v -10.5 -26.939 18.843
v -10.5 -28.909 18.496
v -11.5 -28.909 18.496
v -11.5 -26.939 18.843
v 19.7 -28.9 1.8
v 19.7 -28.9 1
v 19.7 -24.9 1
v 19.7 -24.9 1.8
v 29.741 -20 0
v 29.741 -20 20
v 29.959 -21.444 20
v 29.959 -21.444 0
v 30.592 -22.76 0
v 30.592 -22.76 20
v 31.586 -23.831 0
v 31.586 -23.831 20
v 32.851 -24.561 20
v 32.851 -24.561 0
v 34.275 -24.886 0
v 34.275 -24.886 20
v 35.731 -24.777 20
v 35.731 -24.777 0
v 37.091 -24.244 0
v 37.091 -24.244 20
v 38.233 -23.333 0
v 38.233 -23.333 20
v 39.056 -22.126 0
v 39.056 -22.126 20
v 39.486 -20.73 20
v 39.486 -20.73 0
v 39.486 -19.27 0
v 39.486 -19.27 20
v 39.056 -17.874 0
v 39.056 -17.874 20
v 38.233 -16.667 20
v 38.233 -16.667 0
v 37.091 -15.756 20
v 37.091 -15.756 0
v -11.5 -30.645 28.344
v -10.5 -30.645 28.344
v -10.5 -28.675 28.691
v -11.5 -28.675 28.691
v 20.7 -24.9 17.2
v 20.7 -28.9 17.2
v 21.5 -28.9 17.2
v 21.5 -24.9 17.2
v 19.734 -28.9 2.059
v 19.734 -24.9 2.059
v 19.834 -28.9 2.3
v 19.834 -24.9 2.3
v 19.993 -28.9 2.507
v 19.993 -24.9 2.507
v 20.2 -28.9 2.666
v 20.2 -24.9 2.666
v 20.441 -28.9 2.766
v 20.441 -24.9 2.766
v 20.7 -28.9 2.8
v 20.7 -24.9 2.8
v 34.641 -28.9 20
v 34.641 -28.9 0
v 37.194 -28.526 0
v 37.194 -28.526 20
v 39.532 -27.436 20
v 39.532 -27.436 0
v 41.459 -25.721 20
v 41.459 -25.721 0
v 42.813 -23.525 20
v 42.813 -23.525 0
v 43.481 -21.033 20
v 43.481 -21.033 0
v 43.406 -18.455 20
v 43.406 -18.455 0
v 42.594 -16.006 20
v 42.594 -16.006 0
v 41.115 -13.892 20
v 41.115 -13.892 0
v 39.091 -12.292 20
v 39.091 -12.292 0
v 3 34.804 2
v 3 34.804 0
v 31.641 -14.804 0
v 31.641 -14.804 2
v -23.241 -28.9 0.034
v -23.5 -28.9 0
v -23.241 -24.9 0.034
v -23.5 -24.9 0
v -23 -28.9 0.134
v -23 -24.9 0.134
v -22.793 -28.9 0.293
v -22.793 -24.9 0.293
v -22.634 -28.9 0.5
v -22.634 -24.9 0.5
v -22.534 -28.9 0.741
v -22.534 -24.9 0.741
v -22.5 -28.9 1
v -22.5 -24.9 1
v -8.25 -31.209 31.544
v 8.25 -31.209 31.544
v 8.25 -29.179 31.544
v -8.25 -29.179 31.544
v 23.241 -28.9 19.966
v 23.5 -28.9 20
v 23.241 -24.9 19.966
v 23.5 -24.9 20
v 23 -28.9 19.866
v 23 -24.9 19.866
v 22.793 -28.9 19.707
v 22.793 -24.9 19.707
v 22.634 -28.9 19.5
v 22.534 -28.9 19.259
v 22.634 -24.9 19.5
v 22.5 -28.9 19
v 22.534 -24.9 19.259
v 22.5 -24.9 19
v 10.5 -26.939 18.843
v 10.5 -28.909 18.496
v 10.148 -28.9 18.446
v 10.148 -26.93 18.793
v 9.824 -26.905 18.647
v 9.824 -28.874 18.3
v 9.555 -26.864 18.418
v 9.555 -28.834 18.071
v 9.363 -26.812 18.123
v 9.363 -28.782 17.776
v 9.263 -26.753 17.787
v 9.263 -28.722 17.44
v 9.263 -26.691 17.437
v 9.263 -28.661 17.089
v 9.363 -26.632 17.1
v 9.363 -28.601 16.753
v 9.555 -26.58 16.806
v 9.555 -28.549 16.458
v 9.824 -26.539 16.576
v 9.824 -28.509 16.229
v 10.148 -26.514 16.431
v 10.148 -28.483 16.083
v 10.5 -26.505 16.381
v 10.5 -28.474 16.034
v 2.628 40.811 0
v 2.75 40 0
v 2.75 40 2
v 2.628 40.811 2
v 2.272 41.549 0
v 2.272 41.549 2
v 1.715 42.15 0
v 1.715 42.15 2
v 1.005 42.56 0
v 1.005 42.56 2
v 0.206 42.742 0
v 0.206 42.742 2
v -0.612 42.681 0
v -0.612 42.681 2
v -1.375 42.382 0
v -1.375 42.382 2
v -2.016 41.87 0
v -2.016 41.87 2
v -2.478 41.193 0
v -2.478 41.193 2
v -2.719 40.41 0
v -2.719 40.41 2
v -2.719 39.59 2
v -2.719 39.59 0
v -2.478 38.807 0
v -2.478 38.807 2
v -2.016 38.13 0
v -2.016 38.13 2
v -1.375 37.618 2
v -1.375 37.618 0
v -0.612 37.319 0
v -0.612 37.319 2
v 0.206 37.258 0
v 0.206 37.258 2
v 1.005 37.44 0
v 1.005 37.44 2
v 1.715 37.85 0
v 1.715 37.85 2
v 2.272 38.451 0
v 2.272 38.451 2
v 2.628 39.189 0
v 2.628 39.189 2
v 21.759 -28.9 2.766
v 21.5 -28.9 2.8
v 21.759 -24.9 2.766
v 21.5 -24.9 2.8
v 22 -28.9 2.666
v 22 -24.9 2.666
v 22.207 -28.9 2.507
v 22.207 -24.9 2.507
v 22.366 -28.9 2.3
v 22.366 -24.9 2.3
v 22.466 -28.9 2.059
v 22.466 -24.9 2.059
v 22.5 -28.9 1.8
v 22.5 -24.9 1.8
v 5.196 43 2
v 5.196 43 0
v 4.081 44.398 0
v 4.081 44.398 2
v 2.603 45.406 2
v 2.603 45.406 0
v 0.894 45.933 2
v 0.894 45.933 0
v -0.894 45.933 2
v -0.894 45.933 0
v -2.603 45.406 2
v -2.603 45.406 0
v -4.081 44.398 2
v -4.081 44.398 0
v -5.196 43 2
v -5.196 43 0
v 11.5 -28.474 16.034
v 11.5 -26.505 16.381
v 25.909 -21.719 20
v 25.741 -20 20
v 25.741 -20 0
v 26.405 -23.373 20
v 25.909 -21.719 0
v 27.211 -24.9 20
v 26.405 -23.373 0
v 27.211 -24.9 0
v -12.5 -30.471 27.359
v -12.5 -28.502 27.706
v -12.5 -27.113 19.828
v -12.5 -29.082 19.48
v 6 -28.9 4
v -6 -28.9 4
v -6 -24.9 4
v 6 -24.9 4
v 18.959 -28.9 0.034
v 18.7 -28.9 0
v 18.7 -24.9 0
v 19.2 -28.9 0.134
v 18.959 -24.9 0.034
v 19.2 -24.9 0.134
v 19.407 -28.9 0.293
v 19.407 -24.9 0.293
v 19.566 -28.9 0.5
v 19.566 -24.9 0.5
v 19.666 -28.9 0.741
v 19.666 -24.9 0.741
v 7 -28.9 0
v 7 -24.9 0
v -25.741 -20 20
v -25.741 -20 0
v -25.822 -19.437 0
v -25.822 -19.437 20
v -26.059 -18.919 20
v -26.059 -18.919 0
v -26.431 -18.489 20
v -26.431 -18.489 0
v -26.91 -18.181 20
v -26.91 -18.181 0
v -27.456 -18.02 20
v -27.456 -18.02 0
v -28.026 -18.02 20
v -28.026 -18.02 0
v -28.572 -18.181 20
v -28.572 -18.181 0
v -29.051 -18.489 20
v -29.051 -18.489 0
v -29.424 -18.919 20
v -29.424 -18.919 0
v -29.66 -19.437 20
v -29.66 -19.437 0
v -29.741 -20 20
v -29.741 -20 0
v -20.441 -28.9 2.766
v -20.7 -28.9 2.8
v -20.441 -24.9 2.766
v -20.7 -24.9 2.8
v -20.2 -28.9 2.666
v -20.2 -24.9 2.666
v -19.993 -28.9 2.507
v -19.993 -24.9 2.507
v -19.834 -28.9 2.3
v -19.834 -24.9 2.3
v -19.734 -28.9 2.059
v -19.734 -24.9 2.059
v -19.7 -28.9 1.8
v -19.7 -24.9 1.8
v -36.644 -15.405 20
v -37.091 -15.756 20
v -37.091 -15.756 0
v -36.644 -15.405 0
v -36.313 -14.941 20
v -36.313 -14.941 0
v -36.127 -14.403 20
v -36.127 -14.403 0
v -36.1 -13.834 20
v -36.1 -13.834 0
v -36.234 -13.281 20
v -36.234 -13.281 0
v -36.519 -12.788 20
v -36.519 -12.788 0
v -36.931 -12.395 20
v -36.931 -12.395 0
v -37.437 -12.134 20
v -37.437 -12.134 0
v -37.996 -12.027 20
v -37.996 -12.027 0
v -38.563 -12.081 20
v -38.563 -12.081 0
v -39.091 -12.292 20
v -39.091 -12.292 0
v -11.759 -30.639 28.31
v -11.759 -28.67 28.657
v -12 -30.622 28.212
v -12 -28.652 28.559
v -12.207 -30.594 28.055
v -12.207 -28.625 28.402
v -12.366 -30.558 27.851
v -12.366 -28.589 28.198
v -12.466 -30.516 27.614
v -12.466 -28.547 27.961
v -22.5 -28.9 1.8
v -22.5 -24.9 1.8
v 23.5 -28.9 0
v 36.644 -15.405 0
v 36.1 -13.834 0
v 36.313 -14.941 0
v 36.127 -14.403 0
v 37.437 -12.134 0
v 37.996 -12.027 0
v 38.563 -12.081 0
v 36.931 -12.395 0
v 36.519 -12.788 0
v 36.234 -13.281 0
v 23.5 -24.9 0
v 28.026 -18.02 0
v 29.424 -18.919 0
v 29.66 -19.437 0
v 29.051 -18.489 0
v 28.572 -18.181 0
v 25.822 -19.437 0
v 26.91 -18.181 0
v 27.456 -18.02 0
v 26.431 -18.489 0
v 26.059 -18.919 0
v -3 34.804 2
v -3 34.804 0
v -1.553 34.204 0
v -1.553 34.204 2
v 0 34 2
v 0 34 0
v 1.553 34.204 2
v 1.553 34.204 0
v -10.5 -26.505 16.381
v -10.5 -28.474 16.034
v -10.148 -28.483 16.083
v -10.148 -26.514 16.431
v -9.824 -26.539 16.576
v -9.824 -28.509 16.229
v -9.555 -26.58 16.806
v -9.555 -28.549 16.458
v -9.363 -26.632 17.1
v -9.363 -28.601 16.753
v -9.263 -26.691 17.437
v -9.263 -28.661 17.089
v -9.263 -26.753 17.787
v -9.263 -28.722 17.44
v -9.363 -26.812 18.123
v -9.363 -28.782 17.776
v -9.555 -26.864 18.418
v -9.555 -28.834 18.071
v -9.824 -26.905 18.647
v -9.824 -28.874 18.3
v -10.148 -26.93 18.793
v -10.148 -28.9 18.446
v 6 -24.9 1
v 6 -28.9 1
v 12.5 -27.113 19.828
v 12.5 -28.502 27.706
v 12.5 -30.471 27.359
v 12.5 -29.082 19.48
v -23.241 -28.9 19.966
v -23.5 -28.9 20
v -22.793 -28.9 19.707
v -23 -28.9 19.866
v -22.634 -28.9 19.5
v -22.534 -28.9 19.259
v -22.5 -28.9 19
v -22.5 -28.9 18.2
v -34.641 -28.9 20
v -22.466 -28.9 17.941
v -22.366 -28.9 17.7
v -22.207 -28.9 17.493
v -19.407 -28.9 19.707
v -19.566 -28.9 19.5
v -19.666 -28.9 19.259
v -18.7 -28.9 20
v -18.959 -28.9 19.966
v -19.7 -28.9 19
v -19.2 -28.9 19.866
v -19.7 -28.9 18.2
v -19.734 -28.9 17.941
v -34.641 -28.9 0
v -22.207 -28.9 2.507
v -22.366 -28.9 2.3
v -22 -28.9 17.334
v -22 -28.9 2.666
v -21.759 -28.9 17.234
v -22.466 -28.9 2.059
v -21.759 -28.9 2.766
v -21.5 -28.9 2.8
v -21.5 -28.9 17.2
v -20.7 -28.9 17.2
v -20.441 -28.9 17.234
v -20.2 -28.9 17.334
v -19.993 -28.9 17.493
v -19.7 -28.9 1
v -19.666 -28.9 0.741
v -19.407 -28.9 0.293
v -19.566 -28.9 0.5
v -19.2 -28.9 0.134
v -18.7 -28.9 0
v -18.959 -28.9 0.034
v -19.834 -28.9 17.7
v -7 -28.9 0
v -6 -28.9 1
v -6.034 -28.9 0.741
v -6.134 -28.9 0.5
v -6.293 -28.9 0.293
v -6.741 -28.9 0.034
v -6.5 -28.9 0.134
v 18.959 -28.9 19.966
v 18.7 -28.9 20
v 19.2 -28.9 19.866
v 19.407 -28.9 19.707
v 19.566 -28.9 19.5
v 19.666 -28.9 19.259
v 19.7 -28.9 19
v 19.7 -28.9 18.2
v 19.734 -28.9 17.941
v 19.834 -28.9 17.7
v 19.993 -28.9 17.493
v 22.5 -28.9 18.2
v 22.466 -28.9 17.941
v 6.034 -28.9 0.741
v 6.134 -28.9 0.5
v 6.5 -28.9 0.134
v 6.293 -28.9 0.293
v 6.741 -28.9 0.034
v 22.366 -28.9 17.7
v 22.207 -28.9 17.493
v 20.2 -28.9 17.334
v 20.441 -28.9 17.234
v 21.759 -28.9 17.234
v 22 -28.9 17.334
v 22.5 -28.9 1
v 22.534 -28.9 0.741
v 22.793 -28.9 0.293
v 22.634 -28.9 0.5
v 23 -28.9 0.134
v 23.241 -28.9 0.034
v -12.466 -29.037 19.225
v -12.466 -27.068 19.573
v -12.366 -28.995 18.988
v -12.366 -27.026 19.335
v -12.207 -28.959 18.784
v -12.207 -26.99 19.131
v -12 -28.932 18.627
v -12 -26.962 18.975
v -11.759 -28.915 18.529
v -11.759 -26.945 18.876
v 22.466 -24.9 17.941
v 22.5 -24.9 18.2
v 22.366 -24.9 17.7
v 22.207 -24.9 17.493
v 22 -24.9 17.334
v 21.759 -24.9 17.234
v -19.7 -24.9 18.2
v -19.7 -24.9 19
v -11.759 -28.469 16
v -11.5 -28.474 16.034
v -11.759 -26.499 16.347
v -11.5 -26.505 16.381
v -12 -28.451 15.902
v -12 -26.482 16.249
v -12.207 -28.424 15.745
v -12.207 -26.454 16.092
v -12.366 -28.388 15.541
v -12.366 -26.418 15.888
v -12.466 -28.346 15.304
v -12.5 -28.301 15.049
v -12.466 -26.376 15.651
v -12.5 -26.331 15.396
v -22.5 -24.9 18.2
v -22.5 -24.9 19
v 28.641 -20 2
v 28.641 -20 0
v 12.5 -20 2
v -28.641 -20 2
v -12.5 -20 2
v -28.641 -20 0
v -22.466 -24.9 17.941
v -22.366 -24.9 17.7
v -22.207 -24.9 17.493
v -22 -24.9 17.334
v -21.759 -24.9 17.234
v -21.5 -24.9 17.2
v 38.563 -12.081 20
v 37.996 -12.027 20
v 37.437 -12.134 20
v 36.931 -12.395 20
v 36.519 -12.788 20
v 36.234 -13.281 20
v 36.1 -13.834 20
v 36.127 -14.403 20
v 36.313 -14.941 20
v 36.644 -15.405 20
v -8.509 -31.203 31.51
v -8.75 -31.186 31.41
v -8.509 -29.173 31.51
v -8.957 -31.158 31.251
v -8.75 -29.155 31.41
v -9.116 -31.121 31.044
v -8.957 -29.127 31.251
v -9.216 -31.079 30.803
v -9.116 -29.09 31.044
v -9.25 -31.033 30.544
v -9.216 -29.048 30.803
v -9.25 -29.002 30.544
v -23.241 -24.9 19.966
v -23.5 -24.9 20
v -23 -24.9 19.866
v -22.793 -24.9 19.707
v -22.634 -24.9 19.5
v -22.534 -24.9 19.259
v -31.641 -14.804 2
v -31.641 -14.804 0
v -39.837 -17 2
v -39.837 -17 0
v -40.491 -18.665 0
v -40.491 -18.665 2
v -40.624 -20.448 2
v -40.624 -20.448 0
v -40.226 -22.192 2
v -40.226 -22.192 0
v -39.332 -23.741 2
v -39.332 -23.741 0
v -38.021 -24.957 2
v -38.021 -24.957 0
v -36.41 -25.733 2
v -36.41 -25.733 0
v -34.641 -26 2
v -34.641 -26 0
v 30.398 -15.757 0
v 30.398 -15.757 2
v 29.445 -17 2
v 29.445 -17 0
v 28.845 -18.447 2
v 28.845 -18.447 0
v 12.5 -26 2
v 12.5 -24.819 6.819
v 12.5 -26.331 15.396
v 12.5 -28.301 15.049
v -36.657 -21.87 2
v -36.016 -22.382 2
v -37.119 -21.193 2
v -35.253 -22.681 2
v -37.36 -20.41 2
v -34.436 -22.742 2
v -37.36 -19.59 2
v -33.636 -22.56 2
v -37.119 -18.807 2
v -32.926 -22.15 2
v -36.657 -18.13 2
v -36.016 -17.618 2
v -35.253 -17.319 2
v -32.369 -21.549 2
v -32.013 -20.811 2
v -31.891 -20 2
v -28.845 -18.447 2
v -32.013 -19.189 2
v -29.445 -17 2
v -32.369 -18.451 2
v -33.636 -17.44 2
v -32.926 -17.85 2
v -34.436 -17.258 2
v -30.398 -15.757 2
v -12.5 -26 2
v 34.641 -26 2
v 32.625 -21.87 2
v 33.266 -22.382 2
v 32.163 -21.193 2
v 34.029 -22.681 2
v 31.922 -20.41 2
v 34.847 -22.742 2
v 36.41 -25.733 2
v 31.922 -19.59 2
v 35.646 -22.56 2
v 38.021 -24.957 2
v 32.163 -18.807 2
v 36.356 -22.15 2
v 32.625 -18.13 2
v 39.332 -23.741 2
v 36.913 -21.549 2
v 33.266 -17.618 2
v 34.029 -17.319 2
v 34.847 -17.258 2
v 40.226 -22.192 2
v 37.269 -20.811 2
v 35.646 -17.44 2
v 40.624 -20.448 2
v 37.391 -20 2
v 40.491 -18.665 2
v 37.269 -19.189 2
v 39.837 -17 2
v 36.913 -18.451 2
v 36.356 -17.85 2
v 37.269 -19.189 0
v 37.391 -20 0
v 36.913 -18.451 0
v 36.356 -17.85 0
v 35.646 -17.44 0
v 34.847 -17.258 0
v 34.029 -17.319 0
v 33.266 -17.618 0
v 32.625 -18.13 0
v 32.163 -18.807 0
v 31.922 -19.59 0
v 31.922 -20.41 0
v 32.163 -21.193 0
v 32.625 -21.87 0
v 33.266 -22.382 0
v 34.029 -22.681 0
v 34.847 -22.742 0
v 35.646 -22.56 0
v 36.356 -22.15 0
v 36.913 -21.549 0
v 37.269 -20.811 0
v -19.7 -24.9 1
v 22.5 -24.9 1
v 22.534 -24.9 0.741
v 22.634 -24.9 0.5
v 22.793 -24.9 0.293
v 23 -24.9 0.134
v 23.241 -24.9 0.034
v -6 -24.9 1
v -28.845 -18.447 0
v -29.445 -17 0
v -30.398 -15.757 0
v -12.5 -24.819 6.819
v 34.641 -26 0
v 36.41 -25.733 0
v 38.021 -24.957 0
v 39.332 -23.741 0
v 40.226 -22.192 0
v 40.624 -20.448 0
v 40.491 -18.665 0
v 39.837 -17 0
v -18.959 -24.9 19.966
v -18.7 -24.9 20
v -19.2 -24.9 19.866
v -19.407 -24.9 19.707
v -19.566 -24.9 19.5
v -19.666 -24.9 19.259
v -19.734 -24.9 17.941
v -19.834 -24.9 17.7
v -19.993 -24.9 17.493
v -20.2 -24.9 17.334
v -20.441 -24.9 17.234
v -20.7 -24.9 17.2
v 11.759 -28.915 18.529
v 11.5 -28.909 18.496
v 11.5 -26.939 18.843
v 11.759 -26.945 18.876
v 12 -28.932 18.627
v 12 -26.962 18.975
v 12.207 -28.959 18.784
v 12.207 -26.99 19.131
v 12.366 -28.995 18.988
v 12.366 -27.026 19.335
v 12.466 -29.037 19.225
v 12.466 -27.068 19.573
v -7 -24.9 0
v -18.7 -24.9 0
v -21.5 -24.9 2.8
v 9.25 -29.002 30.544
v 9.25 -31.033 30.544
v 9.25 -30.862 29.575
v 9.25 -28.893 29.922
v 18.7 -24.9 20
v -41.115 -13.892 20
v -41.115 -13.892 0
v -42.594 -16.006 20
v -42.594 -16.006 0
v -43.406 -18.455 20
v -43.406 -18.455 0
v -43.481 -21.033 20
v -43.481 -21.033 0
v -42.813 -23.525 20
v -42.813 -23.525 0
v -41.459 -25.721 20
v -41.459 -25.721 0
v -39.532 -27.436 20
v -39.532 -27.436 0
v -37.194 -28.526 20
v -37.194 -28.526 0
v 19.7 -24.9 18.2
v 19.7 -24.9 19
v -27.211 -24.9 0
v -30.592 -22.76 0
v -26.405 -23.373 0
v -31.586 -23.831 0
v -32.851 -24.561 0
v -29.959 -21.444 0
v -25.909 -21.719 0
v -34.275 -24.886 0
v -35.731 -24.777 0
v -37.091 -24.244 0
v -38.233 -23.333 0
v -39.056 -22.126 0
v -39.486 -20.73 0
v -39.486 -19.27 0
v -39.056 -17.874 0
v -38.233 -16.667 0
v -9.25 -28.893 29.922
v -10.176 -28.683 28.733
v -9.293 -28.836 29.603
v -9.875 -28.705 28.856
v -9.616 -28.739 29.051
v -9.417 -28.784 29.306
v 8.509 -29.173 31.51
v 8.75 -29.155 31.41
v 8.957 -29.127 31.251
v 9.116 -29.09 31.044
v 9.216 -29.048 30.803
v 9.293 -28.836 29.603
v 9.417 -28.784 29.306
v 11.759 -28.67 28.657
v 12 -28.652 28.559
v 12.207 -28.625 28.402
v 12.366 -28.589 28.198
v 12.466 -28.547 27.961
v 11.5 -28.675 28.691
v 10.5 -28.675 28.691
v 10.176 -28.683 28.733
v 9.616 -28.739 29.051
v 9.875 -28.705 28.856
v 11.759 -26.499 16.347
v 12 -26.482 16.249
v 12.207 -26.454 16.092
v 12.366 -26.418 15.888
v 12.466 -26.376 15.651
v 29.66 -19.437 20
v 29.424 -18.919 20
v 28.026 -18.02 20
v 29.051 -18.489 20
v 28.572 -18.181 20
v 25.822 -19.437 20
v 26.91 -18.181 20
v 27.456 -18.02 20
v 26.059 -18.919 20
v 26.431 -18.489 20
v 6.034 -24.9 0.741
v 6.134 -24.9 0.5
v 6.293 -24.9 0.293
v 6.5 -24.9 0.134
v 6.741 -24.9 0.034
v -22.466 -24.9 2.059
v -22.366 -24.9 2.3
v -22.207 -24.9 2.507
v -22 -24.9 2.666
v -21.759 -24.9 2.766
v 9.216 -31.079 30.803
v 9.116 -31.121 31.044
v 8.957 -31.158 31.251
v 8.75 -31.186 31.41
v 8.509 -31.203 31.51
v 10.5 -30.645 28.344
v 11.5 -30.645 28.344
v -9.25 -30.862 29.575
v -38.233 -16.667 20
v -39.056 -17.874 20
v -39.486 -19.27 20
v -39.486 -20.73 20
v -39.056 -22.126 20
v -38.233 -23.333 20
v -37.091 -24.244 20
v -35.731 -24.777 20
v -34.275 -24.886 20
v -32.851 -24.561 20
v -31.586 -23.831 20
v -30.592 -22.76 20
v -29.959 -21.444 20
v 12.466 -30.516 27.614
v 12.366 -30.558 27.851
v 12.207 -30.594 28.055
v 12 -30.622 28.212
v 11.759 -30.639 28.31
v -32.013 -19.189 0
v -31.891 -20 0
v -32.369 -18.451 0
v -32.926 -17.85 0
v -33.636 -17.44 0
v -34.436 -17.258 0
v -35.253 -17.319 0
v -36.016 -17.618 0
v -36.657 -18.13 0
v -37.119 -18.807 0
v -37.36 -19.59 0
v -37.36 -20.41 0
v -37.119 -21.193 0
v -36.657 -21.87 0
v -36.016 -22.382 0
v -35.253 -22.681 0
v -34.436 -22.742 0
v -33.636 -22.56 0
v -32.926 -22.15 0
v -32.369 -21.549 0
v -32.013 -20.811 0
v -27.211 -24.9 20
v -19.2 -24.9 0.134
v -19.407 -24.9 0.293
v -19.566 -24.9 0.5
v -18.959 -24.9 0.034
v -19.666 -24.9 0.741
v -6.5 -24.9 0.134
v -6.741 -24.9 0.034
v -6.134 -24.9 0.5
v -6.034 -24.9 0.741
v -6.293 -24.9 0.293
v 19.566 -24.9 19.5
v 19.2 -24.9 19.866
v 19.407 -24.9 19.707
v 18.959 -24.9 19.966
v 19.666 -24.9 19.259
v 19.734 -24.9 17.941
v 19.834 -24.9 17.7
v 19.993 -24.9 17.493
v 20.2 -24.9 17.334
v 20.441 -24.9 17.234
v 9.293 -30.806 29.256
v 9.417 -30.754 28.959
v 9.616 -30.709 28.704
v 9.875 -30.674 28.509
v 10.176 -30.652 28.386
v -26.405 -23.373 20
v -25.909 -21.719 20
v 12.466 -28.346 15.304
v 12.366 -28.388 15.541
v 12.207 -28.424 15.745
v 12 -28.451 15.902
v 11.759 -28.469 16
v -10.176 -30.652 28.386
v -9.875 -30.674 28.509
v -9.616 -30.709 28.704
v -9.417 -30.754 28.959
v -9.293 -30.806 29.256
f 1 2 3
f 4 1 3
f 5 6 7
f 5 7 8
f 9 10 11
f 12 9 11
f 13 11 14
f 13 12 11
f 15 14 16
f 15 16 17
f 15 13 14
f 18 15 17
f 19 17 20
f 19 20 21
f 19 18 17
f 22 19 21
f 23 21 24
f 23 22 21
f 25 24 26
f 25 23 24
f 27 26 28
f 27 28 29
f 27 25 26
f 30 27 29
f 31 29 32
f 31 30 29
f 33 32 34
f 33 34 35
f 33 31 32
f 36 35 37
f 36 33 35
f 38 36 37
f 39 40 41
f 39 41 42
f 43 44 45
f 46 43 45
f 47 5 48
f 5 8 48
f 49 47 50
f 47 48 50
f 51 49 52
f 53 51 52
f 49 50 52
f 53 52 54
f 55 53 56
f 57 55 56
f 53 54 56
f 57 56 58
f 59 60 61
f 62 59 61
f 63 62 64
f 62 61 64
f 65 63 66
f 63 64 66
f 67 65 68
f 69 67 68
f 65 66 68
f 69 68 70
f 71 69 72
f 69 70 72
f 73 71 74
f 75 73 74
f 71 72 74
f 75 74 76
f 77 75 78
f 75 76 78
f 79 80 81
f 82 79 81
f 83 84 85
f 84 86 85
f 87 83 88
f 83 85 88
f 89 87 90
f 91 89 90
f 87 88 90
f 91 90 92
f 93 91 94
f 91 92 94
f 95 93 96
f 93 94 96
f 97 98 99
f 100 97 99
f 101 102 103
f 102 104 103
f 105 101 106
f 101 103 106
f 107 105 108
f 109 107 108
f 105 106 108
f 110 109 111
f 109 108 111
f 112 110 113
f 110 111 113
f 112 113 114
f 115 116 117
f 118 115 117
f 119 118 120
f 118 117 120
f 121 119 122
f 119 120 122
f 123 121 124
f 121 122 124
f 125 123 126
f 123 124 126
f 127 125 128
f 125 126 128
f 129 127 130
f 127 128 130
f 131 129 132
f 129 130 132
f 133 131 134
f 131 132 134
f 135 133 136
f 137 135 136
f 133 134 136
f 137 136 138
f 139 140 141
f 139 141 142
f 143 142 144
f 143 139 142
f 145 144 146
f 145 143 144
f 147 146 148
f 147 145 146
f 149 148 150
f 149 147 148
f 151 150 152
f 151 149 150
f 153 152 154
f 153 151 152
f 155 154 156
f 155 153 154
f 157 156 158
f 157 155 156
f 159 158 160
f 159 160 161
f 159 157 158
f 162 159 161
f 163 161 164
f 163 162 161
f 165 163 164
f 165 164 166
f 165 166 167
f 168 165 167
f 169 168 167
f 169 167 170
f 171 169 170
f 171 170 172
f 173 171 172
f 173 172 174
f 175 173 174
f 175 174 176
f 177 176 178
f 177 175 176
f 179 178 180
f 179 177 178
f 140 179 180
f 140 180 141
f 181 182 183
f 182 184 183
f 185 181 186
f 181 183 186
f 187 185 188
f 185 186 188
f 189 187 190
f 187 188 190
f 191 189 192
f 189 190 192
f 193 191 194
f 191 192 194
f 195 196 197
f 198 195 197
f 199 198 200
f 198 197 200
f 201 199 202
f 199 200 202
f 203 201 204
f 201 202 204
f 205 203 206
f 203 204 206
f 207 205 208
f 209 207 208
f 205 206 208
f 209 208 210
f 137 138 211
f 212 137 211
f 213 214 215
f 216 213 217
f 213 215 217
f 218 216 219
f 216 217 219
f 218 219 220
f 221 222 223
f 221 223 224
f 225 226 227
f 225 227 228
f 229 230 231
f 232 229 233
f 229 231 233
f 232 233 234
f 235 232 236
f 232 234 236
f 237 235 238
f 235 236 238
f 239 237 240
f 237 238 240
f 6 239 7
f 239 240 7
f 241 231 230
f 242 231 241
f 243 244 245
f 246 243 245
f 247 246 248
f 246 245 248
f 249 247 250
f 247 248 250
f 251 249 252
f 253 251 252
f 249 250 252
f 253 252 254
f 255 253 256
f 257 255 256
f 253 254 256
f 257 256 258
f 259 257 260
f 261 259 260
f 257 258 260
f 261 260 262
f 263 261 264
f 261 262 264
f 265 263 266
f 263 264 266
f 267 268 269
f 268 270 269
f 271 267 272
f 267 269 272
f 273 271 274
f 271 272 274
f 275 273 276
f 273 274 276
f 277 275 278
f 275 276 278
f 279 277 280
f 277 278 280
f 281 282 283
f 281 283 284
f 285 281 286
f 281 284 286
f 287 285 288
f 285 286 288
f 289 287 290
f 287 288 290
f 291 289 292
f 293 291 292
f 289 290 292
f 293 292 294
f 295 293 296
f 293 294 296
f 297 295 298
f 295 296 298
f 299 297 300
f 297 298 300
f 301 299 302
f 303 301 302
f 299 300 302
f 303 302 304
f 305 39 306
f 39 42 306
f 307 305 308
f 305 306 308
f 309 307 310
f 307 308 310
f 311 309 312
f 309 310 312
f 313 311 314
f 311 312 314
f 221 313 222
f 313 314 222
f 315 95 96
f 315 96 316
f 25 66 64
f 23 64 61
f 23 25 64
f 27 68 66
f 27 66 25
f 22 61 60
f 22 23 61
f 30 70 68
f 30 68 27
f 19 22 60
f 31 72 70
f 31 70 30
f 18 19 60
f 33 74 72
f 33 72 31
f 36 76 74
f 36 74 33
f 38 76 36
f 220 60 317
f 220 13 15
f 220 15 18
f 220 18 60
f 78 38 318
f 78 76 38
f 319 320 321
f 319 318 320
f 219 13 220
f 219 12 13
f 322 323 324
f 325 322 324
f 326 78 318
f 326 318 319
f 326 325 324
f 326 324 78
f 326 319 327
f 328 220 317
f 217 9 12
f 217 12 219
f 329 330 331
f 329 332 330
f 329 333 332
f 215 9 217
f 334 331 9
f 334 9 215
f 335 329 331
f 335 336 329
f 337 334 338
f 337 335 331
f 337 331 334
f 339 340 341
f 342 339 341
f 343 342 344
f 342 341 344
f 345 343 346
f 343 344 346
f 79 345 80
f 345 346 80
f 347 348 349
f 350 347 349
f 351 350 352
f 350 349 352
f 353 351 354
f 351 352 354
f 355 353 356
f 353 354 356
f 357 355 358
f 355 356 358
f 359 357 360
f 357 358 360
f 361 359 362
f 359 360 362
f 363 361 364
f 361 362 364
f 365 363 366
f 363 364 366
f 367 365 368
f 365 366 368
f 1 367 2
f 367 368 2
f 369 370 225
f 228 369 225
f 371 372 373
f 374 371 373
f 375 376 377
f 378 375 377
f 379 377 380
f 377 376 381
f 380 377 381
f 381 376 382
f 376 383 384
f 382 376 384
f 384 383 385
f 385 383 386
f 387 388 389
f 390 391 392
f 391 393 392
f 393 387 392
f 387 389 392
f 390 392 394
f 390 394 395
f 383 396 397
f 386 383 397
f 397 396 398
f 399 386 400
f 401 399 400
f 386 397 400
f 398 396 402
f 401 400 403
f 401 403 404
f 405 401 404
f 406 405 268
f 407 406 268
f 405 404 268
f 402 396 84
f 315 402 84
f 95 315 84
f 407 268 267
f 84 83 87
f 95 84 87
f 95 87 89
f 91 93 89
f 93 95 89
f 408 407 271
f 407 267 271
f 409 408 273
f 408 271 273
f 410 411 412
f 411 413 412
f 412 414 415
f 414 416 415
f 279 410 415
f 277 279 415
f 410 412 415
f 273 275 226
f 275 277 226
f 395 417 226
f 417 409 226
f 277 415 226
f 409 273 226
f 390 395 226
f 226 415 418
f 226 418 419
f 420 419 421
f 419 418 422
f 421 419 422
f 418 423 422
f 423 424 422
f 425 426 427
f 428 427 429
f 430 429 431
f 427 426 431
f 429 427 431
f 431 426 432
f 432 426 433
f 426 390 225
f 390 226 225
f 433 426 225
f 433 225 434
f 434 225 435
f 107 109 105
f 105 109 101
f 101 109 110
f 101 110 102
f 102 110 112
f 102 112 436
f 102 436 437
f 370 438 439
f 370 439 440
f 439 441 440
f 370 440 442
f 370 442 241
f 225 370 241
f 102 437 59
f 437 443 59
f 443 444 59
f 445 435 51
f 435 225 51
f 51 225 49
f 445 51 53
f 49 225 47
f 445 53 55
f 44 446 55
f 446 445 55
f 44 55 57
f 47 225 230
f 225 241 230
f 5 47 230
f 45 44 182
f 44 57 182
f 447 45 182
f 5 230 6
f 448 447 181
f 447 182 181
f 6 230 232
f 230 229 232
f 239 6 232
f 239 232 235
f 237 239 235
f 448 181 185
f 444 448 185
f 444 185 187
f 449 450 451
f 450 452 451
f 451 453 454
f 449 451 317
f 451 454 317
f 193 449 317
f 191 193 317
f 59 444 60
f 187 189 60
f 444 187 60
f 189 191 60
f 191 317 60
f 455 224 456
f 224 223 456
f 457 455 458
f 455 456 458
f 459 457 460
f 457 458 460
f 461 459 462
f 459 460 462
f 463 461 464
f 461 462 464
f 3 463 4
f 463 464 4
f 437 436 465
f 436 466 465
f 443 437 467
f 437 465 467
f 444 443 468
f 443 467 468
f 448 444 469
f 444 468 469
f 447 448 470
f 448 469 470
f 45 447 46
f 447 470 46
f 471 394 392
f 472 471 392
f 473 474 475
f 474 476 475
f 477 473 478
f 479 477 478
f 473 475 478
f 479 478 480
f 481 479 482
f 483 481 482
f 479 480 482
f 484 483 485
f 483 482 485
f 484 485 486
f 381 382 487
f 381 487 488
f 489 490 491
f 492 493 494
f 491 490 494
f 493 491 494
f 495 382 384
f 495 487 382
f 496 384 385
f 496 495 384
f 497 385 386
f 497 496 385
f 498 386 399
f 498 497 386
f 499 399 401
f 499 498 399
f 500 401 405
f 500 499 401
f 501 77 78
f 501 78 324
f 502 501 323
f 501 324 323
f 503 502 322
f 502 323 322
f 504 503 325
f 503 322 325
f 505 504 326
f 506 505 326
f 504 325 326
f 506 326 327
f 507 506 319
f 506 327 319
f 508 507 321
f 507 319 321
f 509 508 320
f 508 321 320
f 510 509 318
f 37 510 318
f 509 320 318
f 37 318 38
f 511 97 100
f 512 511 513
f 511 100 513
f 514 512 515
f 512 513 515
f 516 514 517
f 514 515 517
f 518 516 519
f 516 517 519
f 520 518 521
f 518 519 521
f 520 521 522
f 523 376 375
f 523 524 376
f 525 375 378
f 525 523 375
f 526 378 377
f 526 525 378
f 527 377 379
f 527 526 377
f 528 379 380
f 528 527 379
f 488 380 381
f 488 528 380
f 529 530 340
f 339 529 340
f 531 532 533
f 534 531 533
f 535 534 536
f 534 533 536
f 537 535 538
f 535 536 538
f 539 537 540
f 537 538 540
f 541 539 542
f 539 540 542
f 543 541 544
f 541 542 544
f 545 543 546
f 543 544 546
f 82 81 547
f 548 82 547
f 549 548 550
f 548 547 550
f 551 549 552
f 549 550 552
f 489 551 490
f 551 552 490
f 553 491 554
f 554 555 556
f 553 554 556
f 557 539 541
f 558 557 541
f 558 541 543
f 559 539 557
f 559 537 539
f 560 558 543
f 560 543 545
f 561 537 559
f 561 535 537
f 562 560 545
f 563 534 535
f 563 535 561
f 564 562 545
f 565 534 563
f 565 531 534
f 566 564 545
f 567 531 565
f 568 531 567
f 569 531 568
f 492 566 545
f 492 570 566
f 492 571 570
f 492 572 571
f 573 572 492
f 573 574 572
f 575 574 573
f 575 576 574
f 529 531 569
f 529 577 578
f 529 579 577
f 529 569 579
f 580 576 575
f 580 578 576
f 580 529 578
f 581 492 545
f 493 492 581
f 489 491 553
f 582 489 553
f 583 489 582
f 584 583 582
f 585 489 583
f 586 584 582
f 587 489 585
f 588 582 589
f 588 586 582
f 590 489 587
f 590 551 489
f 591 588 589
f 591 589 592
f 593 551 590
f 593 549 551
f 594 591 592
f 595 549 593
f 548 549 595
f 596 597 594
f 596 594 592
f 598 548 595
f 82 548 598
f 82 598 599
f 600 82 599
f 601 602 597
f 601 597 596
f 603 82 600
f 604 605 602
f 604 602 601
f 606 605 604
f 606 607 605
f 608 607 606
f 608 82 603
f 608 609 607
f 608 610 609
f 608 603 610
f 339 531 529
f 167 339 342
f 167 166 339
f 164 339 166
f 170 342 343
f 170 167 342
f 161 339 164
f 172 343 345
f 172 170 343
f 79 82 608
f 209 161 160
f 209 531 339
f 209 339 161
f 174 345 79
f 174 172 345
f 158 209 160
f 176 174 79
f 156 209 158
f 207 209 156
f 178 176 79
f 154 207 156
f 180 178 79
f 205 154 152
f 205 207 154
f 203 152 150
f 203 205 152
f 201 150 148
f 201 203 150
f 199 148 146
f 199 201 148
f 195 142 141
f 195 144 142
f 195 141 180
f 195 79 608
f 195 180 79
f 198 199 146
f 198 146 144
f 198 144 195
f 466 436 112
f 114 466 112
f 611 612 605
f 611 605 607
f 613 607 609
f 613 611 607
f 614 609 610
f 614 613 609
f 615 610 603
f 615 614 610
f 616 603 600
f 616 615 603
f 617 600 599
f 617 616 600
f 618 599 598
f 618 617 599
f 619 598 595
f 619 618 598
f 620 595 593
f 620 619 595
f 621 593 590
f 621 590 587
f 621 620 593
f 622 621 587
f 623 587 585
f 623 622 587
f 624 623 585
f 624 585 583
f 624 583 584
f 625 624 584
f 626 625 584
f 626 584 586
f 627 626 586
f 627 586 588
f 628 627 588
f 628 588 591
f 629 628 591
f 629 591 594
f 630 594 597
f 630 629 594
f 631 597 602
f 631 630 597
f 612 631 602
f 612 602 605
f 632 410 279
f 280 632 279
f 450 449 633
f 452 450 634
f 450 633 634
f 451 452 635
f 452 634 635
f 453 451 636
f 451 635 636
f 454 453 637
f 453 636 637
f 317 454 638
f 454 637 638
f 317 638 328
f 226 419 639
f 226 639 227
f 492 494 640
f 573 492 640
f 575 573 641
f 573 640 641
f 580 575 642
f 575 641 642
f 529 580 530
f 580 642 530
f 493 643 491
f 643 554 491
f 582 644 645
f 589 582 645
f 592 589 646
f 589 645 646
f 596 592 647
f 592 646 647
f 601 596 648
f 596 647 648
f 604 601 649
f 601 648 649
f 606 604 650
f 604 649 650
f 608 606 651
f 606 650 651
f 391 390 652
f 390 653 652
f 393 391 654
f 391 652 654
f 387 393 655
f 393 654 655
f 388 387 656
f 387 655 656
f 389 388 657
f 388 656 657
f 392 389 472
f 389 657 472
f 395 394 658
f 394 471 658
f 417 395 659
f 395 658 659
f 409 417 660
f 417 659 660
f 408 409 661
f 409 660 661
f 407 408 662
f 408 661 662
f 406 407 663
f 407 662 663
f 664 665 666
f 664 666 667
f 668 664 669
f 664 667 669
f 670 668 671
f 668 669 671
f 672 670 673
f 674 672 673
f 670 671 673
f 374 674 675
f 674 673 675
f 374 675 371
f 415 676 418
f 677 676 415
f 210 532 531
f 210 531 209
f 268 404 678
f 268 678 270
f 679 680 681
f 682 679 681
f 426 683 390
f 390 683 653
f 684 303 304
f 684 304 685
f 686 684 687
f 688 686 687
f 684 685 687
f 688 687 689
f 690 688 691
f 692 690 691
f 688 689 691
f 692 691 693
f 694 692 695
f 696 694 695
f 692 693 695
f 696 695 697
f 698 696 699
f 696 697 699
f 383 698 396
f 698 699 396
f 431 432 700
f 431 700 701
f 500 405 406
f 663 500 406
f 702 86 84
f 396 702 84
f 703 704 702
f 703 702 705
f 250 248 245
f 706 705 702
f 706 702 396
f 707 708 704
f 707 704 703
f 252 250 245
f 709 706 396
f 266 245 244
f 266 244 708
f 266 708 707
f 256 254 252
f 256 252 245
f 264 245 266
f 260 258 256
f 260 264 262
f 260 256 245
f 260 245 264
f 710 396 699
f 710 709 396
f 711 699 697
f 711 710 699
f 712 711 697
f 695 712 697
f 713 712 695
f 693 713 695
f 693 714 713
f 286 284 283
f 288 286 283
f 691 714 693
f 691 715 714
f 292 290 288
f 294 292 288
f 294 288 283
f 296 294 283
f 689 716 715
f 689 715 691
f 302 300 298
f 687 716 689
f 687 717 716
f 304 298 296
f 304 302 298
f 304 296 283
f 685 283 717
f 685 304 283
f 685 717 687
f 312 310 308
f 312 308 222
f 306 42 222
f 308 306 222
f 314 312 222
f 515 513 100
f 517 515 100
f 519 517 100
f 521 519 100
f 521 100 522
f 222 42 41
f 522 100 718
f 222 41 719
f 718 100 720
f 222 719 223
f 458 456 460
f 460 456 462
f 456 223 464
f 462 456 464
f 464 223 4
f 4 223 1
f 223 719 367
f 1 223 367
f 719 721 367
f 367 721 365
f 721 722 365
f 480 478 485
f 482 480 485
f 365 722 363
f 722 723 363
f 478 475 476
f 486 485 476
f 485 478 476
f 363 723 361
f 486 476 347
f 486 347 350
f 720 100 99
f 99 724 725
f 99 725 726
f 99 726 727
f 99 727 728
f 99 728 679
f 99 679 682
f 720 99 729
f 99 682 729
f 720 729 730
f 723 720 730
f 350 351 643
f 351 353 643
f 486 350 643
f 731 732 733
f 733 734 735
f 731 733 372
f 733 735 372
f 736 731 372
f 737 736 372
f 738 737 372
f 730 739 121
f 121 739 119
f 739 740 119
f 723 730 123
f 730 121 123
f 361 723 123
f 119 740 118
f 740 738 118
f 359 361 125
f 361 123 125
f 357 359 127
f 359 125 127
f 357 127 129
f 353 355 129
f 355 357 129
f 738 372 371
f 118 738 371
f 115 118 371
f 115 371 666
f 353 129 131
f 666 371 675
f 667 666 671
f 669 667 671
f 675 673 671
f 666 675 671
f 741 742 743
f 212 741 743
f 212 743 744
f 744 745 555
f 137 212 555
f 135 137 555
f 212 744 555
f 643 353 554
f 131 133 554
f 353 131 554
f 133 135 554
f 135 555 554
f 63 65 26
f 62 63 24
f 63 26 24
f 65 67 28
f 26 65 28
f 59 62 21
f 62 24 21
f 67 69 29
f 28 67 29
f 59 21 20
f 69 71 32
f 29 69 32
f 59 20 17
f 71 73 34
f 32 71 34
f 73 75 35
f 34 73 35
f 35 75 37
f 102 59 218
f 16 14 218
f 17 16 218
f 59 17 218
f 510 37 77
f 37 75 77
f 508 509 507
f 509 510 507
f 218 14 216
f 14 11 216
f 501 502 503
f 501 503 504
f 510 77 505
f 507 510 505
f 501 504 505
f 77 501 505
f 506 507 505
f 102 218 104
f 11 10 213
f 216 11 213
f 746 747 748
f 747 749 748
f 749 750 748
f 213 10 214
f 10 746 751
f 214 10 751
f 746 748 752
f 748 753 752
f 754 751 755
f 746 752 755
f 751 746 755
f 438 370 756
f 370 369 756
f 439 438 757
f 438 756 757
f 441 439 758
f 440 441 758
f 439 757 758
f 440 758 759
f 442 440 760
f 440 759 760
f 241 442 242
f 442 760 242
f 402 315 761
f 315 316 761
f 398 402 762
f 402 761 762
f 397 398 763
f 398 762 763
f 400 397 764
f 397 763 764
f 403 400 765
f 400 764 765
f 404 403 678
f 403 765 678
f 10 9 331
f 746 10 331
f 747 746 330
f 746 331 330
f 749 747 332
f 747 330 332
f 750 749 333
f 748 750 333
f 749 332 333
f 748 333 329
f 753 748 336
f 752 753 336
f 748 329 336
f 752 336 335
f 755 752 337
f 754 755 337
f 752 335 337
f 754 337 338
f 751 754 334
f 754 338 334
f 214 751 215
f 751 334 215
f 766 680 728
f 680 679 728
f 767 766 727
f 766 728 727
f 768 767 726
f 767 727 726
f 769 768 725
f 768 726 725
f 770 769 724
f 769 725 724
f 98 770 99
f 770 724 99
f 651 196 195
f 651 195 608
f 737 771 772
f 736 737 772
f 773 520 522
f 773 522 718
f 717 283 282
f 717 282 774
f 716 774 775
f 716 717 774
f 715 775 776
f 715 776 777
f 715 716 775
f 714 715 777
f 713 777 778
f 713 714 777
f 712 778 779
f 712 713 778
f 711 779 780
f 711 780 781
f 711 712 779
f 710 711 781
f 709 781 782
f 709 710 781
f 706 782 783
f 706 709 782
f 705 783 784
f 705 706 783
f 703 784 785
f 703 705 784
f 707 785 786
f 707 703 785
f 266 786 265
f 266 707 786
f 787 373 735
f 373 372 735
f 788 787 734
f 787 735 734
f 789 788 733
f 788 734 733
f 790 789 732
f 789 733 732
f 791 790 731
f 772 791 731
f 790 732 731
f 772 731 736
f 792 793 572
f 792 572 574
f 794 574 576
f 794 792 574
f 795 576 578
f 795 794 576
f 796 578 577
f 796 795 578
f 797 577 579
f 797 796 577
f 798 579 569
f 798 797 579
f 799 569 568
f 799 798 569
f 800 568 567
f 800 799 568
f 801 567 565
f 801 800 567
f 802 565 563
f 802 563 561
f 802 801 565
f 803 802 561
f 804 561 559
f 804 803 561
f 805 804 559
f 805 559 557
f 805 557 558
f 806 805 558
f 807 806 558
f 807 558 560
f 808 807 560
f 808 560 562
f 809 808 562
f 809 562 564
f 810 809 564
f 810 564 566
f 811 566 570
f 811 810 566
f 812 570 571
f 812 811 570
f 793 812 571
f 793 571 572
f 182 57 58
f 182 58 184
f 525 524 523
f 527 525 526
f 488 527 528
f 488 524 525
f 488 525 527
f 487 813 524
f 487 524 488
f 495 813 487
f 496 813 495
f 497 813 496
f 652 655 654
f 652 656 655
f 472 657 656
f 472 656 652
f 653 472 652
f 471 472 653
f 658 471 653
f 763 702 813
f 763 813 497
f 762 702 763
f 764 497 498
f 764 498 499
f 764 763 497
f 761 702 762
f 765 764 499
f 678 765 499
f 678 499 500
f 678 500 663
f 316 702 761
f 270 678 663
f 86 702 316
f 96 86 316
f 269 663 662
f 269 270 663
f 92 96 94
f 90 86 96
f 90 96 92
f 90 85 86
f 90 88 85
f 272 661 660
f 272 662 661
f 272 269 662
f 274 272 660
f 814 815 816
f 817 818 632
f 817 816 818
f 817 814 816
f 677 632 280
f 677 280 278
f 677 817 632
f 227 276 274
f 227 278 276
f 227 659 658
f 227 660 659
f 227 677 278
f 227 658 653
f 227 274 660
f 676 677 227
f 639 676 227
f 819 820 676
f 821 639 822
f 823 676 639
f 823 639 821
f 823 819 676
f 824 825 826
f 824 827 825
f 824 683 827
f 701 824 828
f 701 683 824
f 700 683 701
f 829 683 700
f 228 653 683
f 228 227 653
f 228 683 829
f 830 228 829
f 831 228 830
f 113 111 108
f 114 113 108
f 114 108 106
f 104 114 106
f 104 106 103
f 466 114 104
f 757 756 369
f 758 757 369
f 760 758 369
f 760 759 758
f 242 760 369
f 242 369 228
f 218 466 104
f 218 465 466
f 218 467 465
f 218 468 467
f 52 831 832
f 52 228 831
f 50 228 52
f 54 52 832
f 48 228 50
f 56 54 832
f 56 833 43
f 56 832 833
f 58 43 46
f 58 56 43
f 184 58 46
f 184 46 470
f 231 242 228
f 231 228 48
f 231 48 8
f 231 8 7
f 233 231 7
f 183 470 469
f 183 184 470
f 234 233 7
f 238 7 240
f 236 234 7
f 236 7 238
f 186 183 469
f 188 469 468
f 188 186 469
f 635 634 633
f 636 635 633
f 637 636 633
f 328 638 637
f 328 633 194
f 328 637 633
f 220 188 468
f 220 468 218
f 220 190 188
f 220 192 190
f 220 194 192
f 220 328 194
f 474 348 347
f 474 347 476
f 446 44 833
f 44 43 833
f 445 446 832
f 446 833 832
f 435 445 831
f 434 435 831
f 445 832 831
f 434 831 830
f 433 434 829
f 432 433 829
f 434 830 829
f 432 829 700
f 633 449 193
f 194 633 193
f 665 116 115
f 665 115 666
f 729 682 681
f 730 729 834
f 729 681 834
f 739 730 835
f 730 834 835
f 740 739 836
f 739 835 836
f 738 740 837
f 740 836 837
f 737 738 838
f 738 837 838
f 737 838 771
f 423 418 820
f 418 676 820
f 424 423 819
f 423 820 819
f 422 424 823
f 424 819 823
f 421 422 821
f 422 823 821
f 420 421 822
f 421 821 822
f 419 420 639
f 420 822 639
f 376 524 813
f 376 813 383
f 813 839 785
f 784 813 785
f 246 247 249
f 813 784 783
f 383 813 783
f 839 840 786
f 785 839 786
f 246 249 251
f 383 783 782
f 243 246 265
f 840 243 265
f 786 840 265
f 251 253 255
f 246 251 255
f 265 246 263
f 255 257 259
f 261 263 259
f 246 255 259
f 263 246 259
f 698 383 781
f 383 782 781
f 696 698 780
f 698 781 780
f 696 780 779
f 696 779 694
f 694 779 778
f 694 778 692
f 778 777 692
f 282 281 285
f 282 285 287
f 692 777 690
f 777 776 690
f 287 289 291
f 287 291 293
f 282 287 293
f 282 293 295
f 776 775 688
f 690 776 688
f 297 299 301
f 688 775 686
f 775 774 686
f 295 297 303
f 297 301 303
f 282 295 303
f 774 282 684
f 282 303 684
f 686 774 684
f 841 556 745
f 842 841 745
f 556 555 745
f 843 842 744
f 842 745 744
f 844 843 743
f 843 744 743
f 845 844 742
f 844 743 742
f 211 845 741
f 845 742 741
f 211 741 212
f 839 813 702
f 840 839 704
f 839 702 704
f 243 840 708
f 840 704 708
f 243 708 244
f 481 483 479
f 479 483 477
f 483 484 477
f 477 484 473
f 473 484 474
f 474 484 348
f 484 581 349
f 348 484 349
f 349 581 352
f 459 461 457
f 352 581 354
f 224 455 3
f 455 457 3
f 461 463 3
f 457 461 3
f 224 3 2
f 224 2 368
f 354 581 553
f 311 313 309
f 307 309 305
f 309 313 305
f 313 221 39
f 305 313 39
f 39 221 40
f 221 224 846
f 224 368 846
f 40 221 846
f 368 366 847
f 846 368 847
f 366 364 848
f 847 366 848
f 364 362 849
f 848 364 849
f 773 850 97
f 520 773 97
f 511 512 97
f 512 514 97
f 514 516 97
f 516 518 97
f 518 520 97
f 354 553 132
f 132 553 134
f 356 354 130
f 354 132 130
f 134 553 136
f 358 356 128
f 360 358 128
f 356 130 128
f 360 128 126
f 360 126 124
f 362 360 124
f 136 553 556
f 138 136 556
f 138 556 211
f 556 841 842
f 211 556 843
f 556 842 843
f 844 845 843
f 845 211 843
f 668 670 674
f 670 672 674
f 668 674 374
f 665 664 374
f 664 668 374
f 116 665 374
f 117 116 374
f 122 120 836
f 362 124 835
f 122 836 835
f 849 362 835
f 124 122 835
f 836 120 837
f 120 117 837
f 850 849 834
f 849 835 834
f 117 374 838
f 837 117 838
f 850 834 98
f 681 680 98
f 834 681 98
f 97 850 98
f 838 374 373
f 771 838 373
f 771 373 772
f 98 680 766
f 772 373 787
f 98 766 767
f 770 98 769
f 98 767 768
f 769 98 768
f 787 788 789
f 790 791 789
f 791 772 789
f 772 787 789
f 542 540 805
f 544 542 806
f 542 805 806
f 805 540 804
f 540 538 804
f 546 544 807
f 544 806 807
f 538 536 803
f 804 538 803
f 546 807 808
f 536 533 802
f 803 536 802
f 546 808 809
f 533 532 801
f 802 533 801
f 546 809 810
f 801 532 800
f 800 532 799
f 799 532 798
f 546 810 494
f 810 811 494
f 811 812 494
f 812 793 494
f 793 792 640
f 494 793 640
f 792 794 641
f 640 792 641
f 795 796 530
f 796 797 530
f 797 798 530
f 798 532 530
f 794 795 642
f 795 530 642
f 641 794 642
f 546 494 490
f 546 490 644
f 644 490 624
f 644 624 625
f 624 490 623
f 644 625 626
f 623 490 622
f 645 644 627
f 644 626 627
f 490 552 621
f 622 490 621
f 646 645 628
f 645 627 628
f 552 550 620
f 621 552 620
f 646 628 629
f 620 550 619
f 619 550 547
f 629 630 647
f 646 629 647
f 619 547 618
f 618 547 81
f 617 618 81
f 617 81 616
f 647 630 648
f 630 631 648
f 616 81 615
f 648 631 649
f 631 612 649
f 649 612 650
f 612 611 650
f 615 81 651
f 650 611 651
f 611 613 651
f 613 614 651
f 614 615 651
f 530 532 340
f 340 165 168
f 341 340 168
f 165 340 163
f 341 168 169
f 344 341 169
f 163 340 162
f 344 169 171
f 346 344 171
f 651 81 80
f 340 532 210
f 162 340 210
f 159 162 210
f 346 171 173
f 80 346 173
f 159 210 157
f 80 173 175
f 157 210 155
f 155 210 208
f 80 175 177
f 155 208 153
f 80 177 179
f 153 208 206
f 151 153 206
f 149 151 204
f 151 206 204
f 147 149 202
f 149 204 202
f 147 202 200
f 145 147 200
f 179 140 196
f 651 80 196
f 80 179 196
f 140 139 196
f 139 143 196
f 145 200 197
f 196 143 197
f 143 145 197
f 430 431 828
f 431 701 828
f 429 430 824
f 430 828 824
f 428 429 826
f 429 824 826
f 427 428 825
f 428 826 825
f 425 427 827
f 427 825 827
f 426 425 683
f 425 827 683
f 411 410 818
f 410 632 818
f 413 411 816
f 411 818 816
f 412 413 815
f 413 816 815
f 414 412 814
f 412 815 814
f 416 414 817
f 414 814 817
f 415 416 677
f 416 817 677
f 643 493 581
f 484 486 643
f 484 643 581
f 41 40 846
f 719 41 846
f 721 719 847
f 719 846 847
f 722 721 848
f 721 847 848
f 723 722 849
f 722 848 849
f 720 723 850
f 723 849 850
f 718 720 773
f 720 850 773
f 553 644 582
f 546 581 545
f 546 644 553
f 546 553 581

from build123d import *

# Parameters (mm, degrees)
SKETCH_R          = 2.75
PAD_DEPTH         = 2
PAD001_DEPTH      = 12.5
PAD001_DEPTH_BACK = 12.5
POCKET_DEPTH      = 76.0374603668
FILLET_R          = 1
PAD002_DEPTH      = 20
SKETCH005_W       = 2.8
SKETCH005_H       = 2.8
SKETCH005_W_2     = 12
SKETCH005_H_2     = 4
POCKET001_DEPTH   = 4
FILLET001_R       = 1


with BuildPart() as body:
    # Sketch → Pad (new body)
    with BuildSketch(Plane.XY):
        with BuildLine():
            ThreePointArc((5.1961524227, 43), (0, 46), (-5.1961524227, 43))
            Line((-39.8371685741, -17), (-5.1961524227, 43))
            ThreePointArc((-39.8371685741, -17), (-39.8371685741, -23), (-34.6410161514, -26))
            Line((34.6410161514, -26), (-34.6410161514, -26))
            ThreePointArc((34.6410161514, -26), (39.8371685741, -23), (39.8371685741, -17))
            Line((5.1961524227, 43), (39.8371685741, -17))
        make_face()
        with Locations((0, 40)):
            Circle(SKETCH_R, mode=Mode.SUBTRACT)
        with Locations((-34.6410161514, -20)):
            Circle(SKETCH_R, mode=Mode.SUBTRACT)
        with Locations((34.6410161514, -20)):
            Circle(SKETCH_R, mode=Mode.SUBTRACT)
        with BuildLine():
            ThreePointArc((-28.6410161514, -20), (-29.4448637287, -17), (-31.6410161514, -14.8038475773))
            Line((-31.6410161514, -14.8038475773), (-3, 34.8038475773))
            ThreePointArc((-3, 34.8038475773), (0, 34), (3, 34.8038475773))
            Line((3, 34.8038475773), (31.6410161514, -14.8038475773))
            ThreePointArc((31.6410161514, -14.8038475773), (29.4448637287, -17), (28.6410161514, -20))
            Line((28.6410161514, -20), (-28.6410161514, -20))
        make_face(mode=Mode.SUBTRACT)
    extrude(amount=PAD_DEPTH)

    # Sketch001 → Pad001 (join, two sides)
    with BuildSketch(Plane.YZ) as pad001_sk:
        Polygon((-26, 2), (-31.20944533, 31.5442325904), (-29.1785921062, 31.5442325904), (-24.8188379166, 6.8188379166), (-20, 2), align=None)
    extrude(amount=PAD001_DEPTH)
    extrude(pad001_sk.sketch, amount=-PAD001_DEPTH_BACK)

    # Sketch003 (on Face7 of Pad001) → Pocket (cut, through all)
    with BuildSketch(Plane(origin=(0, -24.8739839269, -4.385954484), x_dir=(1, 0, 0), z_dir=(0, -0.984807753, -0.1736481777))):
        with BuildLine():
            ThreePointArc((-10.5, 33.2344681254), (-9.6161165235, 33.6005846489), (-9.25, 34.4844681254))
            Line((-9.25, 36.4844681254), (-9.25, 34.4844681254))
            Line((-12.5, 36.4844681254), (-9.25, 36.4844681254))
            Line((-12.5, 33.2344681254), (-12.5, 36.4844681254))
            Line((-10.5, 33.2344681254), (-12.5, 33.2344681254))
        make_face()
        with BuildLine():
            ThreePointArc((9.25, 34.4844681254), (9.6161165235, 33.6005846489), (10.5, 33.2344681254))
            Line((10.5, 33.2344681254), (12.5, 33.2344681254))
            Line((12.5, 33.2344681254), (12.5, 36.4844681254))
            Line((12.5, 36.4844681254), (9.25, 36.4844681254))
            Line((9.25, 36.4844681254), (9.25, 34.4844681254))
        make_face()
        with BuildLine():
            ThreePointArc((10.5, 23.2344681254), (9.25, 21.9844681254), (10.5, 20.7344681254))
            Line((10.5, 20.7344681254), (12.5, 20.7344681254))
            Line((12.5, 23.2344681254), (12.5, 20.7344681254))
            Line((10.5, 23.2344681254), (12.5, 23.2344681254))
        make_face()
        with BuildLine():
            ThreePointArc((-10.5, 20.7344681254), (-9.25, 21.9844681254), (-10.5, 23.2344681254))
            Line((-10.5, 23.2344681254), (-12.5, 23.2344681254))
            Line((-12.5, 20.7344681254), (-12.5, 23.2344681254))
            Line((-10.5, 20.7344681254), (-12.5, 20.7344681254))
        make_face()
    extrude(amount=-POCKET_DEPTH, mode=Mode.SUBTRACT)

    # Fillet
    fillet_edges = [body.edges().sort_by_distance(p)[0] for p in [
        (9.25, -30.194019, 31.544233),
        (-9.25, -30.194019, 31.544233),
        (-12.5, -29.660281, 28.517256),
        (12.5, -29.660281, 28.517256),
        (12.5, -27.489679, 16.207159),
        (-12.5, -27.489679, 16.207159),
        (-12.5, -27.923799, 18.669178),
        (12.5, -27.923799, 18.669178),
    ]]
    fillet(fillet_edges, radius=FILLET_R)


with BuildPart() as body001:
    # Sketch004 → Pad002 (new body)
    with BuildSketch(Plane.XY):
        with BuildLine():
            ThreePointArc((-37.0910161514, -15.7564755215), (-37.0910161514, -24.2435244785), (-29.7410161514, -20))
            ThreePointArc((-25.7410161514, -20), (-27.7410161514, -18), (-29.7410161514, -20))
            ThreePointArc((-27.211345903, -24.9), (-26.116520119, -22.5579224763), (-25.7410161514, -20))
            Line((-27.211345903, -24.9), (27.211345903, -24.9))
            ThreePointArc((25.7410161514, -20), (26.116520119, -22.5579224763), (27.211345903, -24.9))
            ThreePointArc((29.7410161514, -20), (27.7410161514, -18), (25.7410161514, -20))
            ThreePointArc((29.7410161514, -20), (37.0910161514, -24.2435244785), (37.0910161514, -15.7564755215))
            ThreePointArc((39.0910161514, -12.2923739063), (36.3589653438, -13.0244247139), (37.0910161514, -15.7564755215))
            ThreePointArc((34.6410159769, -28.9), (43.2377559828, -22.3034895857), (39.0910161514, -12.2923739063))
            Line((-34.6409781744, -28.9), (34.6410159769, -28.9))
            ThreePointArc((-39.0910161514, -12.2923739063), (-43.2377510908, -22.3035078429), (-34.6409781744, -28.8999999999))
            ThreePointArc((-37.0910161514, -15.7564755215), (-36.3589653438, -13.0244247139), (-39.0910161514, -12.2923739063))
        make_face()
    extrude(amount=PAD002_DEPTH)

    # Sketch005 (on Face11 of Pad002) → Pocket001 (cut)
    with BuildSketch(Plane.XZ.offset(28.9)):
        with Locations((-21.0999810988, 1.4)):
            Rectangle(SKETCH005_W, SKETCH005_H)
        with Locations((21.1000189012, 1.4)):
            Rectangle(SKETCH005_W, SKETCH005_H)
        with Locations((21.1000189012, 18.6)):
            Rectangle(SKETCH005_W, SKETCH005_H)
        with Locations((-21.0999810988, 18.6)):
            Rectangle(SKETCH005_W, SKETCH005_H)
        with Locations((1.89012e-05, 2)):
            Rectangle(SKETCH005_W_2, SKETCH005_H_2)
    extrude(amount=-POCKET001_DEPTH, mode=Mode.SUBTRACT)

    # Fillet001
    fillet001_edges = [body001.edges().sort_by_distance(p)[0] for p in [
        (-22.499981, -26.9, 17.2),
        (-22.499981, -26.9, 20),
        (-19.699981, -26.9, 17.2),
        (-19.699981, -26.9, 20),
        (22.500019, -26.9, 17.2),
        (22.500019, -26.9, 20),
        (19.700019, -26.9, 20),
        (19.700019, -26.9, 17.2),
        (-19.699981, -26.9, 2.8),
        (-19.699981, -26.9, 0),
        (-22.499981, -26.9, 2.8),
        (-22.499981, -26.9, 0),
        (19.700019, -26.9, 2.8),
        (19.700019, -26.9, 0),
        (22.500019, -26.9, 2.8),
        (22.500019, -26.9, 0),
        (6.000019, -26.9, 0),
        (-5.999981, -26.9, 0),
    ]]
    fillet(fillet001_edges, radius=FILLET001_R)


solid = Compound([body.part, body001.part])
